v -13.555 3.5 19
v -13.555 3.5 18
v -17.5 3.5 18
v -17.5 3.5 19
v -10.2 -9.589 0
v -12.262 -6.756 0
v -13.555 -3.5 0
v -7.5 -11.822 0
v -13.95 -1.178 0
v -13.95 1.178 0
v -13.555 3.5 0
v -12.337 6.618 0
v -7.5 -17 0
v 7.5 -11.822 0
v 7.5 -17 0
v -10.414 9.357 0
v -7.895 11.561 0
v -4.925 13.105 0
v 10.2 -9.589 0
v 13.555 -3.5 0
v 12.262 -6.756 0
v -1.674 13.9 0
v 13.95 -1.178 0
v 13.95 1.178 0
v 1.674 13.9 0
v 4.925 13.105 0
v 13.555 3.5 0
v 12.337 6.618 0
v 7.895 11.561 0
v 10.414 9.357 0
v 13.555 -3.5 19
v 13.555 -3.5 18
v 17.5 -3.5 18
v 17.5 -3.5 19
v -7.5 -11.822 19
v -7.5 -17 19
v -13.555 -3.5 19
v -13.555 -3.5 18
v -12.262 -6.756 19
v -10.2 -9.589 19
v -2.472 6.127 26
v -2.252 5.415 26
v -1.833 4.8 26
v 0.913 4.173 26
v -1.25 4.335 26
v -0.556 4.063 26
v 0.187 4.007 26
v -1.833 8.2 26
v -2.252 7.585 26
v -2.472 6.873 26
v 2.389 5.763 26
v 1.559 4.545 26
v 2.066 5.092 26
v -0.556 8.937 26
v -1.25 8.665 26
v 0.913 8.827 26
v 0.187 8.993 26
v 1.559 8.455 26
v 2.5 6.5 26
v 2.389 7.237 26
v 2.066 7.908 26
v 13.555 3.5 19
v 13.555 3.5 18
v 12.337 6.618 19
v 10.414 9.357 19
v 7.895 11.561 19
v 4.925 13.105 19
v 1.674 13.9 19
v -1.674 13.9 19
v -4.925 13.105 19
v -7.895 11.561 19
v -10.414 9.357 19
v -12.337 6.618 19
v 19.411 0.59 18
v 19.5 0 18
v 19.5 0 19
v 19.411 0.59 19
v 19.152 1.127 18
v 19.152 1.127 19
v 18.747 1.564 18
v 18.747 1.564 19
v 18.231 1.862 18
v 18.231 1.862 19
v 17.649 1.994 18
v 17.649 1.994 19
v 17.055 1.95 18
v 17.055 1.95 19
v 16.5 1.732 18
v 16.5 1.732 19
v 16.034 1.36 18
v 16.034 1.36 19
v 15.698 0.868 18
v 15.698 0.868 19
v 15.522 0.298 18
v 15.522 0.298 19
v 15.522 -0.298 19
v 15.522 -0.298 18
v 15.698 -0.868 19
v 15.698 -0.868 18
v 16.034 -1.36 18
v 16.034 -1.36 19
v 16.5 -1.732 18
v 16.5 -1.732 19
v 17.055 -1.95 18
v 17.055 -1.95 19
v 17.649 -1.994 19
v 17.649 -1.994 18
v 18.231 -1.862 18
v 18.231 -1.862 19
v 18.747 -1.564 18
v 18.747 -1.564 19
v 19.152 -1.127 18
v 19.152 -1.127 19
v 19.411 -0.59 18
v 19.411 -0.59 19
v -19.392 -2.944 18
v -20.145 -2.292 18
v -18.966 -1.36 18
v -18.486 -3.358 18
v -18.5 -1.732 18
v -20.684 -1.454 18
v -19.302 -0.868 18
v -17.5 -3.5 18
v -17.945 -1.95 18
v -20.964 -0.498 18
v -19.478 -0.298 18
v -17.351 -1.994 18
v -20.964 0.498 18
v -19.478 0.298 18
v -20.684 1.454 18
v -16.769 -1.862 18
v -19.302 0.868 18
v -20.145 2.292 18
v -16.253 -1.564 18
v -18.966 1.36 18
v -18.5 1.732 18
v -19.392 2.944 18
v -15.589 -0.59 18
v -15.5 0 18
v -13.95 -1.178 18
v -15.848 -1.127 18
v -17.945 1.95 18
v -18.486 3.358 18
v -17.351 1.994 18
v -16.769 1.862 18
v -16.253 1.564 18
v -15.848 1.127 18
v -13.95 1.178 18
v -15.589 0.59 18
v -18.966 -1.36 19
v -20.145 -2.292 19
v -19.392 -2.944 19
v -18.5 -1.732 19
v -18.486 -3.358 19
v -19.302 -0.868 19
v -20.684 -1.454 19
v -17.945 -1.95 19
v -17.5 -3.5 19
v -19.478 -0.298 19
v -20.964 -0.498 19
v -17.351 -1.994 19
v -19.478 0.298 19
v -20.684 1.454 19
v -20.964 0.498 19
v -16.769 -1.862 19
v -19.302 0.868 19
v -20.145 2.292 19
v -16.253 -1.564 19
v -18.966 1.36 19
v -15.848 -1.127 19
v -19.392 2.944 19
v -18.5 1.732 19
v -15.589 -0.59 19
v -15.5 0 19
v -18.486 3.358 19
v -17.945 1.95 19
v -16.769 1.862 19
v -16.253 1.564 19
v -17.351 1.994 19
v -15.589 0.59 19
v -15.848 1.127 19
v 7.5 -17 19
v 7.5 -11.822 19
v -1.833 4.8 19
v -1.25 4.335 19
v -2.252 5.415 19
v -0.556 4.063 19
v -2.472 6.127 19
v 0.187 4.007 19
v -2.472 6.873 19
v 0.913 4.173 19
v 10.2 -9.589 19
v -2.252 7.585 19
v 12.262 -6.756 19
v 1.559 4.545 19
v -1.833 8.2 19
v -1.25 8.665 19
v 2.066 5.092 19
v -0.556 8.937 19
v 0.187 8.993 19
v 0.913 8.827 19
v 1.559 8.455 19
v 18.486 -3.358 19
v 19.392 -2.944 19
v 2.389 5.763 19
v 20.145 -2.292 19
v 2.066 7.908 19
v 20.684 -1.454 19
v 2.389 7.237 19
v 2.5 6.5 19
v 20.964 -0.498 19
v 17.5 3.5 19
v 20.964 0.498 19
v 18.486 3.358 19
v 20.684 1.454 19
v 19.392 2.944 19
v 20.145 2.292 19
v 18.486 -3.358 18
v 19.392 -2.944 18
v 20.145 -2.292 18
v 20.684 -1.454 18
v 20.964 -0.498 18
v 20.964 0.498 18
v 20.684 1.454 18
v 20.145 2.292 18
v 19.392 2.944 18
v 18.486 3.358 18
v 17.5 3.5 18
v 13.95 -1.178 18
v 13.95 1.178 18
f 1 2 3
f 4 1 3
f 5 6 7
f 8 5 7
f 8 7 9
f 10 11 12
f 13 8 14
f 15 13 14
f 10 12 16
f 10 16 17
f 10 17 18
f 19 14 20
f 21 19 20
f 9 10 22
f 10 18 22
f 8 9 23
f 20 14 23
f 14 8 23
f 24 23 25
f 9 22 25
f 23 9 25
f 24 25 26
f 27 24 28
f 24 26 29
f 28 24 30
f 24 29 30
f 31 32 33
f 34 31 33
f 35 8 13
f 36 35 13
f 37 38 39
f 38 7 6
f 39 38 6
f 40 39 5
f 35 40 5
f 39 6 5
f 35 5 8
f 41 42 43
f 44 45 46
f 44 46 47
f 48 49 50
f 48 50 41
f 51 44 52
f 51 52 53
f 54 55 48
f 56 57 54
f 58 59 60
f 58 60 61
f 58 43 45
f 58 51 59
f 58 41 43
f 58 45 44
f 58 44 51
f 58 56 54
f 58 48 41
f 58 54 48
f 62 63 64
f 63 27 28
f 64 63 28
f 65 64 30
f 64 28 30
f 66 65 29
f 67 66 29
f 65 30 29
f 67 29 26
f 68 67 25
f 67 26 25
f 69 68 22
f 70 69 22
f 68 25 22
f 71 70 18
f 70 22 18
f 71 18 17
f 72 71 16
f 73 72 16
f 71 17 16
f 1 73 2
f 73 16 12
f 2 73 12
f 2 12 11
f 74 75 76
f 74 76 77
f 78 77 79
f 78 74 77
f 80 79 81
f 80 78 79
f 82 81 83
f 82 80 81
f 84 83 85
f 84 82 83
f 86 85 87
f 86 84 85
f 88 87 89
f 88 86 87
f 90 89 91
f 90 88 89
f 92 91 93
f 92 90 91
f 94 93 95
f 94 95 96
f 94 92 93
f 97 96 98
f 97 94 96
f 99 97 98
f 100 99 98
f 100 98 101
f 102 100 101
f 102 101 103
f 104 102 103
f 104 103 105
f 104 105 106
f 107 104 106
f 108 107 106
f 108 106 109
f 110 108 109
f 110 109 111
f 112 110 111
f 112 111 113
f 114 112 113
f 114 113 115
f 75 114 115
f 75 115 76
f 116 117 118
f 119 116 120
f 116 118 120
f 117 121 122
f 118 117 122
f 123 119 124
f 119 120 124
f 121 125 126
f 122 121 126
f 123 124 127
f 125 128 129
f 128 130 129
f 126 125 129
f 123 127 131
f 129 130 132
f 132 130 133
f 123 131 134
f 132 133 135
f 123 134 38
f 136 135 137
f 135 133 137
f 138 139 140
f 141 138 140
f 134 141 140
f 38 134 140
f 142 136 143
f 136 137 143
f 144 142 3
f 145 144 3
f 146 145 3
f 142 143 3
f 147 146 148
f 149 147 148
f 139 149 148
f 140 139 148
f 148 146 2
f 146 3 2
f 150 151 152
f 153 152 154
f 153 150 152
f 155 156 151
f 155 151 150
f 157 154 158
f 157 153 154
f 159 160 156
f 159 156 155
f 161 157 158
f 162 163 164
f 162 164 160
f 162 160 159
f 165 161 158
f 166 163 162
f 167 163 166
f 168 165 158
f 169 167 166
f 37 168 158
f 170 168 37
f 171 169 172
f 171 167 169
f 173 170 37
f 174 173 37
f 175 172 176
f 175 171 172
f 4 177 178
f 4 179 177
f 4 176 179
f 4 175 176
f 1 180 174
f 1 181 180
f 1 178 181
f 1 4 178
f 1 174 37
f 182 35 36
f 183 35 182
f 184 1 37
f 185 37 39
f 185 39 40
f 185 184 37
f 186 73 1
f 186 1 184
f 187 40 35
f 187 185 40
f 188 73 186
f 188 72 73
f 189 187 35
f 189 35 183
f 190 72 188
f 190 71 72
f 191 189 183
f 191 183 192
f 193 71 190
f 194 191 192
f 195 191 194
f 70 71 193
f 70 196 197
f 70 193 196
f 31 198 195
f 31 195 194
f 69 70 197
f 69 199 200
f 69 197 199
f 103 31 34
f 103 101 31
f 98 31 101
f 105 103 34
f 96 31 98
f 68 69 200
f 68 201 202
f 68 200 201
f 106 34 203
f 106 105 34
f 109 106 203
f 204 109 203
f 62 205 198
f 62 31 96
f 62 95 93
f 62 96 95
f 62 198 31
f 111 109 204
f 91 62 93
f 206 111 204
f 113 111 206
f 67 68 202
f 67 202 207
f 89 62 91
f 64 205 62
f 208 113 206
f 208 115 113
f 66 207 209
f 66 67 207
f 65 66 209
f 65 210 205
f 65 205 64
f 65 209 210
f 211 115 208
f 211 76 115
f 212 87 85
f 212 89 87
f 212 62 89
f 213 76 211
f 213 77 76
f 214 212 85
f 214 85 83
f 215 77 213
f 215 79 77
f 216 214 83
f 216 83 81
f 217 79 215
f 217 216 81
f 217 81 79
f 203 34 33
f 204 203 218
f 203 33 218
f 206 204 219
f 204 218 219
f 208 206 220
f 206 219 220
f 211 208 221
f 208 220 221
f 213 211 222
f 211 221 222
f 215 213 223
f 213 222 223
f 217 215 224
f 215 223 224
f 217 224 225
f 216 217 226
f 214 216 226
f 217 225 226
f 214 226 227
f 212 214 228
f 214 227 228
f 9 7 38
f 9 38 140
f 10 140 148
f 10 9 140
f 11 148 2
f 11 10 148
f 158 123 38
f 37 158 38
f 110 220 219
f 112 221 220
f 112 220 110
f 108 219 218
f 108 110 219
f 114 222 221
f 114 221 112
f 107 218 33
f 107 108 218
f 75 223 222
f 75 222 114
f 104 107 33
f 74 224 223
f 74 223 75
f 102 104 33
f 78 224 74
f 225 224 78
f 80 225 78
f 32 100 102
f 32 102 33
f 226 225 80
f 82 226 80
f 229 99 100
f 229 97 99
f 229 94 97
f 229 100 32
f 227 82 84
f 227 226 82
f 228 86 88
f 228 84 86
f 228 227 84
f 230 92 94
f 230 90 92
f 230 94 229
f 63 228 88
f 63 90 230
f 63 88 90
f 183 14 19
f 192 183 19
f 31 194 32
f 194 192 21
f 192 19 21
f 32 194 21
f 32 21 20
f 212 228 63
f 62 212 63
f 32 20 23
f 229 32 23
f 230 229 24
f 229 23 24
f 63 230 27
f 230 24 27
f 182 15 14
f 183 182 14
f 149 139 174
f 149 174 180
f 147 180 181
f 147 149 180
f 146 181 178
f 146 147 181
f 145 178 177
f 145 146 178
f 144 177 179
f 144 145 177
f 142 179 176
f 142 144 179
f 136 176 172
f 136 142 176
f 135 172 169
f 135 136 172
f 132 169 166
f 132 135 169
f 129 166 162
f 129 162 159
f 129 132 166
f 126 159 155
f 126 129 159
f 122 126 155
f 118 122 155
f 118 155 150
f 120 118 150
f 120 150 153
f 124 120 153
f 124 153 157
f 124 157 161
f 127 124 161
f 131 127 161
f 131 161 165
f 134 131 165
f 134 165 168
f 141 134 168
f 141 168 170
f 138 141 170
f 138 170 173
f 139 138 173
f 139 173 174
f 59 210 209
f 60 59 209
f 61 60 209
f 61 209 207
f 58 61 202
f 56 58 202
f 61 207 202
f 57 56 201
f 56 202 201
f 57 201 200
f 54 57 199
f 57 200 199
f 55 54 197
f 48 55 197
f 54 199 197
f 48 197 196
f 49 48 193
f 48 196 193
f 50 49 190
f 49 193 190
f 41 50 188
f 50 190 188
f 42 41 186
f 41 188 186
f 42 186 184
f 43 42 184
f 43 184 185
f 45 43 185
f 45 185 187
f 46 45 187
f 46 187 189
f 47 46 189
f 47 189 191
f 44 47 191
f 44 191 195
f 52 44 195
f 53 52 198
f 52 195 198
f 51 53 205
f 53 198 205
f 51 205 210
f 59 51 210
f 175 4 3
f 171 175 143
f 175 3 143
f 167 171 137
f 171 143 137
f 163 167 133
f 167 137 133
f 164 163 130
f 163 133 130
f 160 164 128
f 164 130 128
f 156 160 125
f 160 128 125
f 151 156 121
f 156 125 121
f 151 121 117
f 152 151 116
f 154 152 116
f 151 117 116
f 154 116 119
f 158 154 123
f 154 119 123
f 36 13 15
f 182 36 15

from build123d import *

# Parameters (mm, degrees)
ESBO_O1_R                = 2
RESSALTO_EXTRUS_O1_DEPTH = 19
CORTE_EXTRUS_O1_DEPTH    = 18
ESBO_O3_R                = 2.5
RESSALTO_EXTRUS_O2_DEPTH = 7


with BuildPart() as part:
    # Esboço1 → Ressalto-extrusão1 (new body)
    with BuildSketch(Plane.XY):
        with BuildLine():
            Line((17.5, 3.5), (13.555441712, 3.5))
            ThreePointArc((13.555441712, 3.5), (0, 14), (-13.555441712, 3.5))
            Line((-13.555441712, 3.5), (-17.5, 3.5))
            ThreePointArc((-17.5, 3.5), (-21, 0), (-17.5, -3.5))
            Line((-17.5, -3.5), (-13.555441712, -3.5))
            ThreePointArc((-13.555441712, -3.5), (-11.320120282, -8.237407166), (-7.5, -11.821590418))
            Line((-7.5, -11.821590418), (-7.5, -14))
            Line((-7.5, -14), (-7.5, -17))
            Line((-7.5, -17), (7.5, -17))
            Line((7.5, -17), (7.5, -14))
            Line((7.5, -14), (7.5, -11.821590418))
            ThreePointArc((7.5, -11.821590418), (11.320120282, -8.237407166), (13.555441712, -3.5))
            Line((13.555441712, -3.5), (17.5, -3.5))
            ThreePointArc((17.5, -3.5), (21, 0), (17.5, 3.5))
        make_face()
        with Locations((17.5, 0)):
            Circle(ESBO_O1_R, mode=Mode.SUBTRACT)
        with Locations((-17.5, 0)):
            Circle(ESBO_O1_R, mode=Mode.SUBTRACT)
    extrude(amount=RESSALTO_EXTRUS_O1_DEPTH)

    # Esboço2 → Corte-extrusão1 (cut)
    with BuildSketch(Plane(origin=(0, 0, 0), x_dir=(-1, 0, 0), z_dir=(0, 0, -1))):
        with BuildLine():
            Line((13.555441712, 3.5), (23.80699558, 3.5))
            Line((23.80699558, 3.5), (23.80699558, -3.5))
            Line((23.80699558, -3.5), (13.555441712, -3.5))
            ThreePointArc((13.555441712, -3.5), (14, 0), (13.555441712, 3.5))
        make_face()
        with BuildLine():
            Line((-13.555441712, 3.5), (-24.760546325, 3.5))
            Line((-24.760546325, 3.5), (-24.760546325, -3.5))
            Line((-24.760546325, -3.5), (-13.555441712, -3.5))
            ThreePointArc((-13.555441712, -3.5), (-14, 0), (-13.555441712, 3.5))
        make_face()
    extrude(amount=-CORTE_EXTRUS_O1_DEPTH, mode=Mode.SUBTRACT)

    # Esboço3 → Ressalto-extrusão2 (add)
    with BuildSketch(Plane.XY.offset(19)):
        with Locations((0, 6.5)):
            Circle(ESBO_O3_R)
    extrude(amount=RESSALTO_EXTRUS_O2_DEPTH)


solid = part.part
